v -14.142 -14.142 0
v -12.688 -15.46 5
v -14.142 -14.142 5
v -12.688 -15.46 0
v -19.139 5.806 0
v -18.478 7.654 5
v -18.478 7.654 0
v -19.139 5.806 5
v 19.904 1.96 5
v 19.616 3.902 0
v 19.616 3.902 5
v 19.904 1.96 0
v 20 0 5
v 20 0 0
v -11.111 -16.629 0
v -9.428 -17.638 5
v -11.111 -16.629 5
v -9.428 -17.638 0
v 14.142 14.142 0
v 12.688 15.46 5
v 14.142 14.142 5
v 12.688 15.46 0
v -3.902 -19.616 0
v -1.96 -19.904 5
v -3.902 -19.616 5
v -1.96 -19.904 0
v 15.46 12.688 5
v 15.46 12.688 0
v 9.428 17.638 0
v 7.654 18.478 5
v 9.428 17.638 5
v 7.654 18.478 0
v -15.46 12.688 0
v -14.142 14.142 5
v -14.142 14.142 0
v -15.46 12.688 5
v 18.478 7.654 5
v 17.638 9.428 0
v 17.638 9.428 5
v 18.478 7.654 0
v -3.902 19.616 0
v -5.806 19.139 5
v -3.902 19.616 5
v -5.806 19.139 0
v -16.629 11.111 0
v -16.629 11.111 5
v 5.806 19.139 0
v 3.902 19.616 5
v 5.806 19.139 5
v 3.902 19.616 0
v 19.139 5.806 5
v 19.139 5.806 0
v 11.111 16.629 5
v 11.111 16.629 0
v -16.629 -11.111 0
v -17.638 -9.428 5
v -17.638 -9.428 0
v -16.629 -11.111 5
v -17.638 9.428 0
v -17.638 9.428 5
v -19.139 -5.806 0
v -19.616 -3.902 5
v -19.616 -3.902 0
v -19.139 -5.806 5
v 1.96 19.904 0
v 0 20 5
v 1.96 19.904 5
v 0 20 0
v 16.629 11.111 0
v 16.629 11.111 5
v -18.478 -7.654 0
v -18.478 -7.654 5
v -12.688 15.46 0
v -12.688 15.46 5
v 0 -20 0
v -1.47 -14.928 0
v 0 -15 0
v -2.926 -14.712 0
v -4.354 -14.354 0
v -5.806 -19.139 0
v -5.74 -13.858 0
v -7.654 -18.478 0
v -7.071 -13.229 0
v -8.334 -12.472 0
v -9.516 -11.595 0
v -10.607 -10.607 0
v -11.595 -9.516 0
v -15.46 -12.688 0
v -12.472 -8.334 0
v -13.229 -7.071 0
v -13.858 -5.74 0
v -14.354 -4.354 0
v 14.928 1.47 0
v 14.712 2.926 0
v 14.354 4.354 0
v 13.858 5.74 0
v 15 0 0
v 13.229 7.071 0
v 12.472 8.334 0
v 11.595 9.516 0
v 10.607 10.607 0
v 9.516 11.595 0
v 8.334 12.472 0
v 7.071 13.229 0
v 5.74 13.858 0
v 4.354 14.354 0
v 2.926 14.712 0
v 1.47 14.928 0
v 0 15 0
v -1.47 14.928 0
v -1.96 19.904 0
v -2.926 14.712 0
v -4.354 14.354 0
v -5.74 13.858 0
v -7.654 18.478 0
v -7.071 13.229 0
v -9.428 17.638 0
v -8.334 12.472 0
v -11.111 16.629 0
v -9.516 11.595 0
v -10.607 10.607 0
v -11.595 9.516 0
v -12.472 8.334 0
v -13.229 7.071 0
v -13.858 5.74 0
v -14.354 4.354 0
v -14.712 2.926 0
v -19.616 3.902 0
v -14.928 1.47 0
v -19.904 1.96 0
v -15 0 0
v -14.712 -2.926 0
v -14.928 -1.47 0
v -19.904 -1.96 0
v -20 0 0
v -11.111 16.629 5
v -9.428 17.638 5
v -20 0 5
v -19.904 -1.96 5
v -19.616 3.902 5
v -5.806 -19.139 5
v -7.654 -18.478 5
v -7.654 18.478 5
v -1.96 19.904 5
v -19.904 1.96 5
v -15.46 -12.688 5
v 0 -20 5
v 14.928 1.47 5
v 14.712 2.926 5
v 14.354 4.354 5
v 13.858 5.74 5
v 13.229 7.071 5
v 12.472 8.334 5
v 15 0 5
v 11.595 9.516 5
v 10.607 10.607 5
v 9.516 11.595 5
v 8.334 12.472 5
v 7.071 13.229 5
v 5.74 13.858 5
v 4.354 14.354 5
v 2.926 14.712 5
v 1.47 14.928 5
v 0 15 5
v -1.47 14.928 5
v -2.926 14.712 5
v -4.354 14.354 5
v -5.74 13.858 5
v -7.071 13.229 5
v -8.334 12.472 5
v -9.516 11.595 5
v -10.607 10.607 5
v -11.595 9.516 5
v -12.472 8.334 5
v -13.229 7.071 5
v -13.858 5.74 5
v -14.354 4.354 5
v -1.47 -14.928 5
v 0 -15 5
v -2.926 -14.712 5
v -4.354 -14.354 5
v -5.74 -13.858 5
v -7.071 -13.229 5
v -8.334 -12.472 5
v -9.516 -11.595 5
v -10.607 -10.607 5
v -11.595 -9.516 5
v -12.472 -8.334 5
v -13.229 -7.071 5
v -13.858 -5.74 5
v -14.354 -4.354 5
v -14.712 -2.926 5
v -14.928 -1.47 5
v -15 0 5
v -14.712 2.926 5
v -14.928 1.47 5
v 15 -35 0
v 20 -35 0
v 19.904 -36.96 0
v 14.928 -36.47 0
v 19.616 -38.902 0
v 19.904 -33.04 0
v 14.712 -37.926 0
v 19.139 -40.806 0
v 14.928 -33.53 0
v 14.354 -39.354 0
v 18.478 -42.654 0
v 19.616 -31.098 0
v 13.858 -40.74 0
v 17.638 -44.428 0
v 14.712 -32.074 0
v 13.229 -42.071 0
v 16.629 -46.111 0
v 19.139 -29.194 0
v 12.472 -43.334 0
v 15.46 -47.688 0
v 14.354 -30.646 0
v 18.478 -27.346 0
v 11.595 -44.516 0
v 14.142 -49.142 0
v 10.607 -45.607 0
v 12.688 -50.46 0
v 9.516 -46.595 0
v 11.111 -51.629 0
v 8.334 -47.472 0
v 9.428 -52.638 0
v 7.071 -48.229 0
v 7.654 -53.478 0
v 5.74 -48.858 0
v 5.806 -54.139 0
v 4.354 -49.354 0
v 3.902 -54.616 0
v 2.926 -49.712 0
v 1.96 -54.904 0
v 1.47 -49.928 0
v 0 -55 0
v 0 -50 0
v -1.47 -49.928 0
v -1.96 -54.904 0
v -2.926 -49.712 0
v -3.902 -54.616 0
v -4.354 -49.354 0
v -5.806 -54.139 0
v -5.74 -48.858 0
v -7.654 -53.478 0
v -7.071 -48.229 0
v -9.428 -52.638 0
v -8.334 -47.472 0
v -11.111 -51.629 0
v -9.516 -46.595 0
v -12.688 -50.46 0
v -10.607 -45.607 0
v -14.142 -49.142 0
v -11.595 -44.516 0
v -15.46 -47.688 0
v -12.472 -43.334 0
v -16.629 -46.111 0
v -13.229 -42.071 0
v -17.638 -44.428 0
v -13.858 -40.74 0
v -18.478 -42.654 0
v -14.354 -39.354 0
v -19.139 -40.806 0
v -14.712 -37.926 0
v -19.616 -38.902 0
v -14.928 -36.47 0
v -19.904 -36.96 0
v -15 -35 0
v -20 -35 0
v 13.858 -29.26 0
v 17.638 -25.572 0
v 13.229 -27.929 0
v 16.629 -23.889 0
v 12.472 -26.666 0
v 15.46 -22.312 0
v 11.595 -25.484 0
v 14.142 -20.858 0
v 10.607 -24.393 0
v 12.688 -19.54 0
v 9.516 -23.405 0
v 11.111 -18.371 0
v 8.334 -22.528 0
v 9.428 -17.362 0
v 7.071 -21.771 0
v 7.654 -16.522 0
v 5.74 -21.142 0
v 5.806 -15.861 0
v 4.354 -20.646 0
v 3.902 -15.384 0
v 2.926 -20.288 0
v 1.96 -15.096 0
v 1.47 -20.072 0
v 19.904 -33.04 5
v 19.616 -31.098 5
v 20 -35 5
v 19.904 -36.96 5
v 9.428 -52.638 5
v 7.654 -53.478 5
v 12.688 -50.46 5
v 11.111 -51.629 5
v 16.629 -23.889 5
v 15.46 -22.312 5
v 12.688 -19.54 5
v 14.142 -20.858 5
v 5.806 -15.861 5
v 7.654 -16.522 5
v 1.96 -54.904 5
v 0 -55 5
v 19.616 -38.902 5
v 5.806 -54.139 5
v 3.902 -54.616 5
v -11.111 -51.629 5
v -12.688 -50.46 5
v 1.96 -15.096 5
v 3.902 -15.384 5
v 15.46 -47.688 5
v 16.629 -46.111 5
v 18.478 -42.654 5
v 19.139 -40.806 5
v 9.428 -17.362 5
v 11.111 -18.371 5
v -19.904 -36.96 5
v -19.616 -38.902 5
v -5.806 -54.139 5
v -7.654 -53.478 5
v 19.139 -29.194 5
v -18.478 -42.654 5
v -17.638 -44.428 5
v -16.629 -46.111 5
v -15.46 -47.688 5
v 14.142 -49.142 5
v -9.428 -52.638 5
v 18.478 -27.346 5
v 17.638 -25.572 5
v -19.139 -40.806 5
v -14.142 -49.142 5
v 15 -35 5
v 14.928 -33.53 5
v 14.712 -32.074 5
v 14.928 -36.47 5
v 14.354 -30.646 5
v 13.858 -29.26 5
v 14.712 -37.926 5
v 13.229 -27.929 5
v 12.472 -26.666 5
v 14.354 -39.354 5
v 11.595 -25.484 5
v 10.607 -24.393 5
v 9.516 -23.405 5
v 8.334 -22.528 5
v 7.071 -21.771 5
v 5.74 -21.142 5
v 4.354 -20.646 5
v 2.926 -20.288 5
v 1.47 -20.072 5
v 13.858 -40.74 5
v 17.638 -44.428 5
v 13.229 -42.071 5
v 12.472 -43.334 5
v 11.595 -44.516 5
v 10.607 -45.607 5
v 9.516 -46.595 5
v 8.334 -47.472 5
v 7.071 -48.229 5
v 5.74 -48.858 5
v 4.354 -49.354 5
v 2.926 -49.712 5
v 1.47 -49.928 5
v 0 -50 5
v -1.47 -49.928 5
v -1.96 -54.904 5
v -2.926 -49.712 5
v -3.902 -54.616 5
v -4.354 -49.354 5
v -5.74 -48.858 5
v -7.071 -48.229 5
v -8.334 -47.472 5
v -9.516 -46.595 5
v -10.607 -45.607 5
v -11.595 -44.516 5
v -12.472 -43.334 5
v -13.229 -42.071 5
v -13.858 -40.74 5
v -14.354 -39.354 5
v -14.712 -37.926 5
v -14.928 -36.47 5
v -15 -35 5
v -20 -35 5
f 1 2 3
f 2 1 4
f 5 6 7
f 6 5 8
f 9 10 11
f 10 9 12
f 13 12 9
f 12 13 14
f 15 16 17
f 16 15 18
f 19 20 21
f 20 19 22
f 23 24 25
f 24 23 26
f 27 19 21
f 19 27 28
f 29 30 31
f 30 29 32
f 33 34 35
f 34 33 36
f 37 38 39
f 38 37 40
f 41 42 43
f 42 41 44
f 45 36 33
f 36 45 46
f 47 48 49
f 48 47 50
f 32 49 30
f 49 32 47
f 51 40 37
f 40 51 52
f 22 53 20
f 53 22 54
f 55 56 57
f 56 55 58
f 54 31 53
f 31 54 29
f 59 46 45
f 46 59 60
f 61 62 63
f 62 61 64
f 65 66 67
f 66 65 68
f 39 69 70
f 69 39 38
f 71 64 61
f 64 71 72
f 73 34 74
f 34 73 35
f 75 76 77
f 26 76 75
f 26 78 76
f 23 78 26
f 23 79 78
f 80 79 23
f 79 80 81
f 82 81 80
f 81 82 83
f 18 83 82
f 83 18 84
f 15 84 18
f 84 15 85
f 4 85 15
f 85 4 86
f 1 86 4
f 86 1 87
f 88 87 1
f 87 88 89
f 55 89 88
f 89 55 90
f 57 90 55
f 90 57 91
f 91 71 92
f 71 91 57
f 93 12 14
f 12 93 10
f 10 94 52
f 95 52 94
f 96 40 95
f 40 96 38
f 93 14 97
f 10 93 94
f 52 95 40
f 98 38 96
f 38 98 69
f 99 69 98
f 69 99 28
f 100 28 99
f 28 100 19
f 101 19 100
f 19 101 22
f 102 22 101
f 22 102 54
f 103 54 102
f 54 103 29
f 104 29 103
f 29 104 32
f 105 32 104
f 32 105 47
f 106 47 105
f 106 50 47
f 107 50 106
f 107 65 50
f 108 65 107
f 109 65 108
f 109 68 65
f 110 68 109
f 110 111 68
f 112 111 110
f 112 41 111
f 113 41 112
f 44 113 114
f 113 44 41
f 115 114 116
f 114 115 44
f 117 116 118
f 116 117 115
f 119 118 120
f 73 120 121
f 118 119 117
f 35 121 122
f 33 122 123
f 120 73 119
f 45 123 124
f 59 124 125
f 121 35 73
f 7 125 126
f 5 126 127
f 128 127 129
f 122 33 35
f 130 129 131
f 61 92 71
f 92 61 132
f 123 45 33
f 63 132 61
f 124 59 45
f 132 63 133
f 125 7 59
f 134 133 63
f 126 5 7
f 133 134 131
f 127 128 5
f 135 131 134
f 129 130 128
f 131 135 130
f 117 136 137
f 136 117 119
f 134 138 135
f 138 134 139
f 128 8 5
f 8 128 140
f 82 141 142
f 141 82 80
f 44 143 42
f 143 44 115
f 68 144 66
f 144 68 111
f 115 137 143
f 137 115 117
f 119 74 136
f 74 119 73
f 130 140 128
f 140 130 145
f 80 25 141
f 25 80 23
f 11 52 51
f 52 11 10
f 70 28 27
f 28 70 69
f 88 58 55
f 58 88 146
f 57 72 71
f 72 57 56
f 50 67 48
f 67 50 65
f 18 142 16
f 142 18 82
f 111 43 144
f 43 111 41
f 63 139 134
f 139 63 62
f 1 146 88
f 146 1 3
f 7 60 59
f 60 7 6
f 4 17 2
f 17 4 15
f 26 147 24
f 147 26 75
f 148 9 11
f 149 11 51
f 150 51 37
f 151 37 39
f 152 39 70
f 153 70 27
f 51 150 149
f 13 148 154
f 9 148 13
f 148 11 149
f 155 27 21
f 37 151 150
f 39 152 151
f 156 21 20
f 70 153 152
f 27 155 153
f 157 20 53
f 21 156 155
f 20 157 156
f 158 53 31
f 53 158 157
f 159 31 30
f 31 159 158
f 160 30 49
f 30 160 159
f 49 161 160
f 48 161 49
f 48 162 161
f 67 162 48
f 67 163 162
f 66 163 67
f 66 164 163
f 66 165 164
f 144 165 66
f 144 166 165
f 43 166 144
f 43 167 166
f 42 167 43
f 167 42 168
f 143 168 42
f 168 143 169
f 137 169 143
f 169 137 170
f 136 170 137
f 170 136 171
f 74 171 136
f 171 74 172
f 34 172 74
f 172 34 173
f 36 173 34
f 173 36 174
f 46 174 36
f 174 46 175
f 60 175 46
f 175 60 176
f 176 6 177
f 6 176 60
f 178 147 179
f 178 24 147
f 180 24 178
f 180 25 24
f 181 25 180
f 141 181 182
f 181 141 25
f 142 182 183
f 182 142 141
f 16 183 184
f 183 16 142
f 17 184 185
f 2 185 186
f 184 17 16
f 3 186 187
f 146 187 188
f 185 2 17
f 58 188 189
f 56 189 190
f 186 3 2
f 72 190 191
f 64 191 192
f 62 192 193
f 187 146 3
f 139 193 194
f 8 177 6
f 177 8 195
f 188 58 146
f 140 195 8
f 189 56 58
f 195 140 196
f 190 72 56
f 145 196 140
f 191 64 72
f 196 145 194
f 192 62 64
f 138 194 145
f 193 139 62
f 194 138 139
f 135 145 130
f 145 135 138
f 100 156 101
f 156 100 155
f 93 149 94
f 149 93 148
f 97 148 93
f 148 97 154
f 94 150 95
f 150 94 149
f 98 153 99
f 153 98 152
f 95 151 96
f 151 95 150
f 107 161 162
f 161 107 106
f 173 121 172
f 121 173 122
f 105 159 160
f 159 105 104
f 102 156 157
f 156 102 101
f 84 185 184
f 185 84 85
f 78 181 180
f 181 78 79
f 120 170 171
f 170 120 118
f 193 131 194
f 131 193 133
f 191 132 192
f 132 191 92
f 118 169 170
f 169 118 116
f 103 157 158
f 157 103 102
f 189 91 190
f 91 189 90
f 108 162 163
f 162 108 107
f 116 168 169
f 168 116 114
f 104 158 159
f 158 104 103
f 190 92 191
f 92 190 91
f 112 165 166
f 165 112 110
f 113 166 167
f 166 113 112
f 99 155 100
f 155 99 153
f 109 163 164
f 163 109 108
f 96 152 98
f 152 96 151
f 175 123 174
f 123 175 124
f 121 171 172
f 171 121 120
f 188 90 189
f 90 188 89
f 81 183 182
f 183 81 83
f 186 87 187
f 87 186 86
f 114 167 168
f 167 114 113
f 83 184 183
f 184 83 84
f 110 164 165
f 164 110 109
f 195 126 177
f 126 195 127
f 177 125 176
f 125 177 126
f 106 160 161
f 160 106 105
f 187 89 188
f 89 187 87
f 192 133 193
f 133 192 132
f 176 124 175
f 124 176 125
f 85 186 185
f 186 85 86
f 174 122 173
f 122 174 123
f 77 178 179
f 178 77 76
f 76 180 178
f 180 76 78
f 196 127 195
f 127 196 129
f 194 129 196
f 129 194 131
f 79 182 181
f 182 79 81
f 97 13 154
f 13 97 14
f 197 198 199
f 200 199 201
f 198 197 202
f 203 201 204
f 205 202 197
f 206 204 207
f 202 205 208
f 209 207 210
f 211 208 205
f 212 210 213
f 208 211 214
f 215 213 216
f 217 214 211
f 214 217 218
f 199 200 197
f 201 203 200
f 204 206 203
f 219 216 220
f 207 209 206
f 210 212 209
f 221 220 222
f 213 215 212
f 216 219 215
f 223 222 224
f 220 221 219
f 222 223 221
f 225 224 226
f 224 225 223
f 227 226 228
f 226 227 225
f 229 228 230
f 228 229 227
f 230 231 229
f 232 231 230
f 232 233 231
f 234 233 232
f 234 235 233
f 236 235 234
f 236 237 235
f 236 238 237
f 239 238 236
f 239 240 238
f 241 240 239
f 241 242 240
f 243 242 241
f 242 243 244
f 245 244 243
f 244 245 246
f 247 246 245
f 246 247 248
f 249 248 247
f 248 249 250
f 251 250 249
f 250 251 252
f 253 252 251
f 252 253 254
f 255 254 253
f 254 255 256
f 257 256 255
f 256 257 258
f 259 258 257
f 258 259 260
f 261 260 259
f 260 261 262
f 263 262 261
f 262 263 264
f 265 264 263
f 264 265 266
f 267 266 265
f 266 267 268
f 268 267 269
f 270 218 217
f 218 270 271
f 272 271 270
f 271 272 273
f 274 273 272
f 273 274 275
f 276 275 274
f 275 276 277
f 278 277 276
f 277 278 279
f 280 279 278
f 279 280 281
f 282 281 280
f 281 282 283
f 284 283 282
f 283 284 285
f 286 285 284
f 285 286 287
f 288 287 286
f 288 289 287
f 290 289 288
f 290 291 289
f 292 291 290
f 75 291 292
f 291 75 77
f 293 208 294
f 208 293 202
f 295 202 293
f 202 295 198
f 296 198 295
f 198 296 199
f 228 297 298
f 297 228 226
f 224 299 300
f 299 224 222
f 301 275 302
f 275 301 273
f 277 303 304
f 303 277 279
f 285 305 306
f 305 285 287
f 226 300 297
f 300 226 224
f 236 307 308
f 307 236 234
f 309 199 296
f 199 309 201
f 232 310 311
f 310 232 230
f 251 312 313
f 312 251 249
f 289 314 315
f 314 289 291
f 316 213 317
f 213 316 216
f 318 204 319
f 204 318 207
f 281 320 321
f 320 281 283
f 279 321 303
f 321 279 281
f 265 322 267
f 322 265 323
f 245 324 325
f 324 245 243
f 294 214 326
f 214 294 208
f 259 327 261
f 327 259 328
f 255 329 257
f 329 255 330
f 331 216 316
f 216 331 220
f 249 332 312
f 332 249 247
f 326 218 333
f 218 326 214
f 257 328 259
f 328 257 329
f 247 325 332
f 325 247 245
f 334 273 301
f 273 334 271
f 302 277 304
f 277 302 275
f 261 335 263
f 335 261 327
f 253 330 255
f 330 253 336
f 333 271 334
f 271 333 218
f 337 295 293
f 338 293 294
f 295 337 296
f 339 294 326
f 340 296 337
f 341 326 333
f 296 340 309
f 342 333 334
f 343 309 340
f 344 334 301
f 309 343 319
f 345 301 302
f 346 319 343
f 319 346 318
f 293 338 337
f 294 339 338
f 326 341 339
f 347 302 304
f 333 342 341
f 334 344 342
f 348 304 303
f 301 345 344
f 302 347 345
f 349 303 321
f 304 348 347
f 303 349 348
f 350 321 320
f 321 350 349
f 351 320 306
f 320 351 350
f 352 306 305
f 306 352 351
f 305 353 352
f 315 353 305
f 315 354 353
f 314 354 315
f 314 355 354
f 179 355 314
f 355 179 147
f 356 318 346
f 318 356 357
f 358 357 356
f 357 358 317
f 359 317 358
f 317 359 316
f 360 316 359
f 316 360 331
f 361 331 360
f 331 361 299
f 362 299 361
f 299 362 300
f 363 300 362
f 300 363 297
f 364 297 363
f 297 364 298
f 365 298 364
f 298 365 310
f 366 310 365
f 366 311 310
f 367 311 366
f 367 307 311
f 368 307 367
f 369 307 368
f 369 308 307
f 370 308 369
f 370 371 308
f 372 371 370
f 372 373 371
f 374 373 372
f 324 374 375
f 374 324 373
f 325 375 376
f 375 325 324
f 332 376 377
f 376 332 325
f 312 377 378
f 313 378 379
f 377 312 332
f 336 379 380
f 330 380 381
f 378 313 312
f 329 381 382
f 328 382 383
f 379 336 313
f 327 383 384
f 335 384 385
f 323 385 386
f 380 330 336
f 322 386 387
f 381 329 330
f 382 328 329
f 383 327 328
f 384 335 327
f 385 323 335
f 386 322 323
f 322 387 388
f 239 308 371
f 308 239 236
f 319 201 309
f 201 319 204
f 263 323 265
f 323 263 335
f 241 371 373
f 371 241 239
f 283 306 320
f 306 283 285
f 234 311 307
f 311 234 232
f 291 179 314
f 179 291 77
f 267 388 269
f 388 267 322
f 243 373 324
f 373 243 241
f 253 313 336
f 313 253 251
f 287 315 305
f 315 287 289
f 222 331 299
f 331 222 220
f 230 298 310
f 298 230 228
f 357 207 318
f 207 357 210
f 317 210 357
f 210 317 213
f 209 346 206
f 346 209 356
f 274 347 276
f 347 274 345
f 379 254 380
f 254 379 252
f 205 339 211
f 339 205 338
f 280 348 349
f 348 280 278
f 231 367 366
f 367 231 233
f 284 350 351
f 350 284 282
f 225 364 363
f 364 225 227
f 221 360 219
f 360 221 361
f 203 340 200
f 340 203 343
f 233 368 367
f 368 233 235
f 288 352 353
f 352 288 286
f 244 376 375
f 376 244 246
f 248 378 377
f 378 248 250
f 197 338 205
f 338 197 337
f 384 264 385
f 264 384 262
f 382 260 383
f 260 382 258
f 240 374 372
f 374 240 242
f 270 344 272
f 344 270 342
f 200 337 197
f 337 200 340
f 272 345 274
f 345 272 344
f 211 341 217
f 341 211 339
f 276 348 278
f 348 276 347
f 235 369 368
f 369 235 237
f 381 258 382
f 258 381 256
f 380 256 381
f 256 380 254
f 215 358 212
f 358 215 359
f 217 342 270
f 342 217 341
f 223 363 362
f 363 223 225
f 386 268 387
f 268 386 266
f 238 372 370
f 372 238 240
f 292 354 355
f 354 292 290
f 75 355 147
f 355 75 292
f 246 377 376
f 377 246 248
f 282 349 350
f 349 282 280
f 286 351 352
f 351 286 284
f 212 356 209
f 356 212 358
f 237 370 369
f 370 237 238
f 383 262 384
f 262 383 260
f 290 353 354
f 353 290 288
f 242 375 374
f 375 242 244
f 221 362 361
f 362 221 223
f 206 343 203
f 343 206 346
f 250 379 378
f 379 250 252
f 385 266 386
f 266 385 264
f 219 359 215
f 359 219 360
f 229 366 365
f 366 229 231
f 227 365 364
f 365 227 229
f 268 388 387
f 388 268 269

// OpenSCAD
//
// S-hook 
//
// This thing makes an S-shaped hook for hanging things. You can use
// it to hang planters, belts, bags, purses, etc.
//
// Instructions
// Simply compile, export, and print! If you want to make the hooks
// a different size, use the following parameters to alter the size.
//
// - The diameter parameter sets the outer diameter of the loops.
// - The thickness is the height and width of the cross section of
//   the loops.
//
// Created by: Charles Bell
//
// Enjoy!
// 
module s_hook(diameter=40,thickness=5) {
  radius=diameter/2;
  difference() {
    cylinder(thickness,radius,radius,$fn=64);
    cylinder(thickness,radius-thickness,radius-thickness,$fn=64);
    translate([0,-radius,0]) cube([radius,radius,thickness]);
  }
  translate([0,thickness-diameter,0]) difference() {
    cylinder(thickness,radius,radius,$fn=64);
    cylinder(thickness,radius-thickness,radius-thickness,$fn=64);
    translate([-radius,0,0]) cube([radius,radius,thickness]);
  }
}

s_hook();
